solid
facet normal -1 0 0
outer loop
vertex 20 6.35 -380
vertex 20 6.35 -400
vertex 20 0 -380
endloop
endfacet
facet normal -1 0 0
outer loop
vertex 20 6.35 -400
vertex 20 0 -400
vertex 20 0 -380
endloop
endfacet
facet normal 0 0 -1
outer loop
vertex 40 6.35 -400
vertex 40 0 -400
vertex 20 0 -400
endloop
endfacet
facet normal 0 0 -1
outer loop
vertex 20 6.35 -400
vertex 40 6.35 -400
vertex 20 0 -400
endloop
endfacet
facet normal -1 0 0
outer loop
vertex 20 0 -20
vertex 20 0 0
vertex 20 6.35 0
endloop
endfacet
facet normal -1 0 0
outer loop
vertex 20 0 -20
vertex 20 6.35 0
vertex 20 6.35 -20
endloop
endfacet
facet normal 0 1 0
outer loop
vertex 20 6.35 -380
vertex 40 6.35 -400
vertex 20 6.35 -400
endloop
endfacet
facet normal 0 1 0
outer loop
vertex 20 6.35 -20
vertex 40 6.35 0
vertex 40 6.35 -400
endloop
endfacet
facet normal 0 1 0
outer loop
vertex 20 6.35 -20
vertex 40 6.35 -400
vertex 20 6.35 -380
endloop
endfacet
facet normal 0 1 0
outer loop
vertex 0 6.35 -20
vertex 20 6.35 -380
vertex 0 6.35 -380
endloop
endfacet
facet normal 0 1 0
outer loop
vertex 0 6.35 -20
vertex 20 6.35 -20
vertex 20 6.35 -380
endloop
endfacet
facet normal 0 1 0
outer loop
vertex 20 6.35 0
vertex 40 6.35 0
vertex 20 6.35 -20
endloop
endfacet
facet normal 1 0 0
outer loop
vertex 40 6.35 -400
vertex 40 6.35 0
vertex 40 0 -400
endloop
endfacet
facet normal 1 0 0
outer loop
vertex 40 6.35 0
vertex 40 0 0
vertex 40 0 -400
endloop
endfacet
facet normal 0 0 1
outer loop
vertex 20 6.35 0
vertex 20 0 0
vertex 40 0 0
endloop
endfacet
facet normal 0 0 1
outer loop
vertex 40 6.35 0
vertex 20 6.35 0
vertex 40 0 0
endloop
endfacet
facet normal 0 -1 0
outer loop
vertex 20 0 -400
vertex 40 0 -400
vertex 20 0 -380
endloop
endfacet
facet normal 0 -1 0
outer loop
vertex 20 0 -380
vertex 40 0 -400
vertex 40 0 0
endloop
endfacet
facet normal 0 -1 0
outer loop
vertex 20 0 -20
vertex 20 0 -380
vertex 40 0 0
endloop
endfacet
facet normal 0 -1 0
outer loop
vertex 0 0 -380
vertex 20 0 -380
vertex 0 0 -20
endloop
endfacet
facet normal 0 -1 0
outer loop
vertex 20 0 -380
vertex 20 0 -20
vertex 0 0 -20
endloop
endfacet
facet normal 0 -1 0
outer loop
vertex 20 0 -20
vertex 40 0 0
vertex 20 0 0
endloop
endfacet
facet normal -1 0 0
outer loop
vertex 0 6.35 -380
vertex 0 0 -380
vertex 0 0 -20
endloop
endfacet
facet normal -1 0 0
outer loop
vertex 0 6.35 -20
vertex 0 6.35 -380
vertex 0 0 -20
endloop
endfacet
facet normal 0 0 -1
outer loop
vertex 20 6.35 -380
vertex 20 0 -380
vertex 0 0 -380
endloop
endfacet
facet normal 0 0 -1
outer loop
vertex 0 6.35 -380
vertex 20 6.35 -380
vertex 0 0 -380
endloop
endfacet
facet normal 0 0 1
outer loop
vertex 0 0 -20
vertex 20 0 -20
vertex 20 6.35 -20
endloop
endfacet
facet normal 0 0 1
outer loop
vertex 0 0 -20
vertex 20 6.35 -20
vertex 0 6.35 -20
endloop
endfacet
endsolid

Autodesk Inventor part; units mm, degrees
ref_plane "YZ Plane" through (0, 0, 0) normal (1, 0, 0) x (0, 1, 0)
ref_plane "XZ Plane" through (0, 0, 0) normal (0, 1, 0) x (-1, 0, 0)
ref_plane "XY Plane" through (0, 0, 0) normal (0, 0, 1) x (1, 0, 0)
sketch "Sketch1" plane through (0, 0, 0) normal (0, 1, 0) x (-1, 0, 0)
  line L0 (0, 0) -> (-40, 0)
  line L1 (-40, 0) -> (-40, -400)
  line L2 (-40, -400) -> (0, -400)
  line L3 (0, -400) -> (0, 0)
  line L4 (0, 0) -> (-20, 0)
  line L5 (-20, 0) -> (-20, -20)
  line L6 (-20, -20) -> (0, -20)
  line L7 (0, -20) -> (0, 0)
  line L8 (0, -400) -> (-20, -400)
  line L9 (-20, -400) -> (-20, -380)
  line L10 (-20, -380) -> (0, -380)
  line L11 (0, -380) -> (0, -400)
  point P0 (0, -380)
  point P1 (0, -20)
  dimension "d0" = 400
  dimension "d1" = 20
  dimension "d2" = 20
  dimension "d3" = 20
  dimension "d4" = 20
  dimension "d5" = 40
extrude "Extrusion1" add sketch "Sketch1" along normal blind 6.35 contours L5 L6 L3 L10 L9 L2 L1 L0
equation "\"d0\" = base_y_dim"
equation "\"d1\" = extrusion_dim"
equation "\"d2\" = extrusion_dim"
equation "\"d3\" = extrusion_dim"
equation "\"d4\" = extrusion_dim"
equation "\"d5\" = ceiling_width"
equation "\"d6\" = top_sheet_thickness"
equation "\"base_y_dim\" = 400"
equation "\"base_thickness\" = 12.7"
equation "\"extrusion_dim\" = 20"
equation "\"top_sheet_thickness\" = 6.35"
equation "\"ceiling_width\" = 40"
properties part number "Top Sheet Metal Left"
